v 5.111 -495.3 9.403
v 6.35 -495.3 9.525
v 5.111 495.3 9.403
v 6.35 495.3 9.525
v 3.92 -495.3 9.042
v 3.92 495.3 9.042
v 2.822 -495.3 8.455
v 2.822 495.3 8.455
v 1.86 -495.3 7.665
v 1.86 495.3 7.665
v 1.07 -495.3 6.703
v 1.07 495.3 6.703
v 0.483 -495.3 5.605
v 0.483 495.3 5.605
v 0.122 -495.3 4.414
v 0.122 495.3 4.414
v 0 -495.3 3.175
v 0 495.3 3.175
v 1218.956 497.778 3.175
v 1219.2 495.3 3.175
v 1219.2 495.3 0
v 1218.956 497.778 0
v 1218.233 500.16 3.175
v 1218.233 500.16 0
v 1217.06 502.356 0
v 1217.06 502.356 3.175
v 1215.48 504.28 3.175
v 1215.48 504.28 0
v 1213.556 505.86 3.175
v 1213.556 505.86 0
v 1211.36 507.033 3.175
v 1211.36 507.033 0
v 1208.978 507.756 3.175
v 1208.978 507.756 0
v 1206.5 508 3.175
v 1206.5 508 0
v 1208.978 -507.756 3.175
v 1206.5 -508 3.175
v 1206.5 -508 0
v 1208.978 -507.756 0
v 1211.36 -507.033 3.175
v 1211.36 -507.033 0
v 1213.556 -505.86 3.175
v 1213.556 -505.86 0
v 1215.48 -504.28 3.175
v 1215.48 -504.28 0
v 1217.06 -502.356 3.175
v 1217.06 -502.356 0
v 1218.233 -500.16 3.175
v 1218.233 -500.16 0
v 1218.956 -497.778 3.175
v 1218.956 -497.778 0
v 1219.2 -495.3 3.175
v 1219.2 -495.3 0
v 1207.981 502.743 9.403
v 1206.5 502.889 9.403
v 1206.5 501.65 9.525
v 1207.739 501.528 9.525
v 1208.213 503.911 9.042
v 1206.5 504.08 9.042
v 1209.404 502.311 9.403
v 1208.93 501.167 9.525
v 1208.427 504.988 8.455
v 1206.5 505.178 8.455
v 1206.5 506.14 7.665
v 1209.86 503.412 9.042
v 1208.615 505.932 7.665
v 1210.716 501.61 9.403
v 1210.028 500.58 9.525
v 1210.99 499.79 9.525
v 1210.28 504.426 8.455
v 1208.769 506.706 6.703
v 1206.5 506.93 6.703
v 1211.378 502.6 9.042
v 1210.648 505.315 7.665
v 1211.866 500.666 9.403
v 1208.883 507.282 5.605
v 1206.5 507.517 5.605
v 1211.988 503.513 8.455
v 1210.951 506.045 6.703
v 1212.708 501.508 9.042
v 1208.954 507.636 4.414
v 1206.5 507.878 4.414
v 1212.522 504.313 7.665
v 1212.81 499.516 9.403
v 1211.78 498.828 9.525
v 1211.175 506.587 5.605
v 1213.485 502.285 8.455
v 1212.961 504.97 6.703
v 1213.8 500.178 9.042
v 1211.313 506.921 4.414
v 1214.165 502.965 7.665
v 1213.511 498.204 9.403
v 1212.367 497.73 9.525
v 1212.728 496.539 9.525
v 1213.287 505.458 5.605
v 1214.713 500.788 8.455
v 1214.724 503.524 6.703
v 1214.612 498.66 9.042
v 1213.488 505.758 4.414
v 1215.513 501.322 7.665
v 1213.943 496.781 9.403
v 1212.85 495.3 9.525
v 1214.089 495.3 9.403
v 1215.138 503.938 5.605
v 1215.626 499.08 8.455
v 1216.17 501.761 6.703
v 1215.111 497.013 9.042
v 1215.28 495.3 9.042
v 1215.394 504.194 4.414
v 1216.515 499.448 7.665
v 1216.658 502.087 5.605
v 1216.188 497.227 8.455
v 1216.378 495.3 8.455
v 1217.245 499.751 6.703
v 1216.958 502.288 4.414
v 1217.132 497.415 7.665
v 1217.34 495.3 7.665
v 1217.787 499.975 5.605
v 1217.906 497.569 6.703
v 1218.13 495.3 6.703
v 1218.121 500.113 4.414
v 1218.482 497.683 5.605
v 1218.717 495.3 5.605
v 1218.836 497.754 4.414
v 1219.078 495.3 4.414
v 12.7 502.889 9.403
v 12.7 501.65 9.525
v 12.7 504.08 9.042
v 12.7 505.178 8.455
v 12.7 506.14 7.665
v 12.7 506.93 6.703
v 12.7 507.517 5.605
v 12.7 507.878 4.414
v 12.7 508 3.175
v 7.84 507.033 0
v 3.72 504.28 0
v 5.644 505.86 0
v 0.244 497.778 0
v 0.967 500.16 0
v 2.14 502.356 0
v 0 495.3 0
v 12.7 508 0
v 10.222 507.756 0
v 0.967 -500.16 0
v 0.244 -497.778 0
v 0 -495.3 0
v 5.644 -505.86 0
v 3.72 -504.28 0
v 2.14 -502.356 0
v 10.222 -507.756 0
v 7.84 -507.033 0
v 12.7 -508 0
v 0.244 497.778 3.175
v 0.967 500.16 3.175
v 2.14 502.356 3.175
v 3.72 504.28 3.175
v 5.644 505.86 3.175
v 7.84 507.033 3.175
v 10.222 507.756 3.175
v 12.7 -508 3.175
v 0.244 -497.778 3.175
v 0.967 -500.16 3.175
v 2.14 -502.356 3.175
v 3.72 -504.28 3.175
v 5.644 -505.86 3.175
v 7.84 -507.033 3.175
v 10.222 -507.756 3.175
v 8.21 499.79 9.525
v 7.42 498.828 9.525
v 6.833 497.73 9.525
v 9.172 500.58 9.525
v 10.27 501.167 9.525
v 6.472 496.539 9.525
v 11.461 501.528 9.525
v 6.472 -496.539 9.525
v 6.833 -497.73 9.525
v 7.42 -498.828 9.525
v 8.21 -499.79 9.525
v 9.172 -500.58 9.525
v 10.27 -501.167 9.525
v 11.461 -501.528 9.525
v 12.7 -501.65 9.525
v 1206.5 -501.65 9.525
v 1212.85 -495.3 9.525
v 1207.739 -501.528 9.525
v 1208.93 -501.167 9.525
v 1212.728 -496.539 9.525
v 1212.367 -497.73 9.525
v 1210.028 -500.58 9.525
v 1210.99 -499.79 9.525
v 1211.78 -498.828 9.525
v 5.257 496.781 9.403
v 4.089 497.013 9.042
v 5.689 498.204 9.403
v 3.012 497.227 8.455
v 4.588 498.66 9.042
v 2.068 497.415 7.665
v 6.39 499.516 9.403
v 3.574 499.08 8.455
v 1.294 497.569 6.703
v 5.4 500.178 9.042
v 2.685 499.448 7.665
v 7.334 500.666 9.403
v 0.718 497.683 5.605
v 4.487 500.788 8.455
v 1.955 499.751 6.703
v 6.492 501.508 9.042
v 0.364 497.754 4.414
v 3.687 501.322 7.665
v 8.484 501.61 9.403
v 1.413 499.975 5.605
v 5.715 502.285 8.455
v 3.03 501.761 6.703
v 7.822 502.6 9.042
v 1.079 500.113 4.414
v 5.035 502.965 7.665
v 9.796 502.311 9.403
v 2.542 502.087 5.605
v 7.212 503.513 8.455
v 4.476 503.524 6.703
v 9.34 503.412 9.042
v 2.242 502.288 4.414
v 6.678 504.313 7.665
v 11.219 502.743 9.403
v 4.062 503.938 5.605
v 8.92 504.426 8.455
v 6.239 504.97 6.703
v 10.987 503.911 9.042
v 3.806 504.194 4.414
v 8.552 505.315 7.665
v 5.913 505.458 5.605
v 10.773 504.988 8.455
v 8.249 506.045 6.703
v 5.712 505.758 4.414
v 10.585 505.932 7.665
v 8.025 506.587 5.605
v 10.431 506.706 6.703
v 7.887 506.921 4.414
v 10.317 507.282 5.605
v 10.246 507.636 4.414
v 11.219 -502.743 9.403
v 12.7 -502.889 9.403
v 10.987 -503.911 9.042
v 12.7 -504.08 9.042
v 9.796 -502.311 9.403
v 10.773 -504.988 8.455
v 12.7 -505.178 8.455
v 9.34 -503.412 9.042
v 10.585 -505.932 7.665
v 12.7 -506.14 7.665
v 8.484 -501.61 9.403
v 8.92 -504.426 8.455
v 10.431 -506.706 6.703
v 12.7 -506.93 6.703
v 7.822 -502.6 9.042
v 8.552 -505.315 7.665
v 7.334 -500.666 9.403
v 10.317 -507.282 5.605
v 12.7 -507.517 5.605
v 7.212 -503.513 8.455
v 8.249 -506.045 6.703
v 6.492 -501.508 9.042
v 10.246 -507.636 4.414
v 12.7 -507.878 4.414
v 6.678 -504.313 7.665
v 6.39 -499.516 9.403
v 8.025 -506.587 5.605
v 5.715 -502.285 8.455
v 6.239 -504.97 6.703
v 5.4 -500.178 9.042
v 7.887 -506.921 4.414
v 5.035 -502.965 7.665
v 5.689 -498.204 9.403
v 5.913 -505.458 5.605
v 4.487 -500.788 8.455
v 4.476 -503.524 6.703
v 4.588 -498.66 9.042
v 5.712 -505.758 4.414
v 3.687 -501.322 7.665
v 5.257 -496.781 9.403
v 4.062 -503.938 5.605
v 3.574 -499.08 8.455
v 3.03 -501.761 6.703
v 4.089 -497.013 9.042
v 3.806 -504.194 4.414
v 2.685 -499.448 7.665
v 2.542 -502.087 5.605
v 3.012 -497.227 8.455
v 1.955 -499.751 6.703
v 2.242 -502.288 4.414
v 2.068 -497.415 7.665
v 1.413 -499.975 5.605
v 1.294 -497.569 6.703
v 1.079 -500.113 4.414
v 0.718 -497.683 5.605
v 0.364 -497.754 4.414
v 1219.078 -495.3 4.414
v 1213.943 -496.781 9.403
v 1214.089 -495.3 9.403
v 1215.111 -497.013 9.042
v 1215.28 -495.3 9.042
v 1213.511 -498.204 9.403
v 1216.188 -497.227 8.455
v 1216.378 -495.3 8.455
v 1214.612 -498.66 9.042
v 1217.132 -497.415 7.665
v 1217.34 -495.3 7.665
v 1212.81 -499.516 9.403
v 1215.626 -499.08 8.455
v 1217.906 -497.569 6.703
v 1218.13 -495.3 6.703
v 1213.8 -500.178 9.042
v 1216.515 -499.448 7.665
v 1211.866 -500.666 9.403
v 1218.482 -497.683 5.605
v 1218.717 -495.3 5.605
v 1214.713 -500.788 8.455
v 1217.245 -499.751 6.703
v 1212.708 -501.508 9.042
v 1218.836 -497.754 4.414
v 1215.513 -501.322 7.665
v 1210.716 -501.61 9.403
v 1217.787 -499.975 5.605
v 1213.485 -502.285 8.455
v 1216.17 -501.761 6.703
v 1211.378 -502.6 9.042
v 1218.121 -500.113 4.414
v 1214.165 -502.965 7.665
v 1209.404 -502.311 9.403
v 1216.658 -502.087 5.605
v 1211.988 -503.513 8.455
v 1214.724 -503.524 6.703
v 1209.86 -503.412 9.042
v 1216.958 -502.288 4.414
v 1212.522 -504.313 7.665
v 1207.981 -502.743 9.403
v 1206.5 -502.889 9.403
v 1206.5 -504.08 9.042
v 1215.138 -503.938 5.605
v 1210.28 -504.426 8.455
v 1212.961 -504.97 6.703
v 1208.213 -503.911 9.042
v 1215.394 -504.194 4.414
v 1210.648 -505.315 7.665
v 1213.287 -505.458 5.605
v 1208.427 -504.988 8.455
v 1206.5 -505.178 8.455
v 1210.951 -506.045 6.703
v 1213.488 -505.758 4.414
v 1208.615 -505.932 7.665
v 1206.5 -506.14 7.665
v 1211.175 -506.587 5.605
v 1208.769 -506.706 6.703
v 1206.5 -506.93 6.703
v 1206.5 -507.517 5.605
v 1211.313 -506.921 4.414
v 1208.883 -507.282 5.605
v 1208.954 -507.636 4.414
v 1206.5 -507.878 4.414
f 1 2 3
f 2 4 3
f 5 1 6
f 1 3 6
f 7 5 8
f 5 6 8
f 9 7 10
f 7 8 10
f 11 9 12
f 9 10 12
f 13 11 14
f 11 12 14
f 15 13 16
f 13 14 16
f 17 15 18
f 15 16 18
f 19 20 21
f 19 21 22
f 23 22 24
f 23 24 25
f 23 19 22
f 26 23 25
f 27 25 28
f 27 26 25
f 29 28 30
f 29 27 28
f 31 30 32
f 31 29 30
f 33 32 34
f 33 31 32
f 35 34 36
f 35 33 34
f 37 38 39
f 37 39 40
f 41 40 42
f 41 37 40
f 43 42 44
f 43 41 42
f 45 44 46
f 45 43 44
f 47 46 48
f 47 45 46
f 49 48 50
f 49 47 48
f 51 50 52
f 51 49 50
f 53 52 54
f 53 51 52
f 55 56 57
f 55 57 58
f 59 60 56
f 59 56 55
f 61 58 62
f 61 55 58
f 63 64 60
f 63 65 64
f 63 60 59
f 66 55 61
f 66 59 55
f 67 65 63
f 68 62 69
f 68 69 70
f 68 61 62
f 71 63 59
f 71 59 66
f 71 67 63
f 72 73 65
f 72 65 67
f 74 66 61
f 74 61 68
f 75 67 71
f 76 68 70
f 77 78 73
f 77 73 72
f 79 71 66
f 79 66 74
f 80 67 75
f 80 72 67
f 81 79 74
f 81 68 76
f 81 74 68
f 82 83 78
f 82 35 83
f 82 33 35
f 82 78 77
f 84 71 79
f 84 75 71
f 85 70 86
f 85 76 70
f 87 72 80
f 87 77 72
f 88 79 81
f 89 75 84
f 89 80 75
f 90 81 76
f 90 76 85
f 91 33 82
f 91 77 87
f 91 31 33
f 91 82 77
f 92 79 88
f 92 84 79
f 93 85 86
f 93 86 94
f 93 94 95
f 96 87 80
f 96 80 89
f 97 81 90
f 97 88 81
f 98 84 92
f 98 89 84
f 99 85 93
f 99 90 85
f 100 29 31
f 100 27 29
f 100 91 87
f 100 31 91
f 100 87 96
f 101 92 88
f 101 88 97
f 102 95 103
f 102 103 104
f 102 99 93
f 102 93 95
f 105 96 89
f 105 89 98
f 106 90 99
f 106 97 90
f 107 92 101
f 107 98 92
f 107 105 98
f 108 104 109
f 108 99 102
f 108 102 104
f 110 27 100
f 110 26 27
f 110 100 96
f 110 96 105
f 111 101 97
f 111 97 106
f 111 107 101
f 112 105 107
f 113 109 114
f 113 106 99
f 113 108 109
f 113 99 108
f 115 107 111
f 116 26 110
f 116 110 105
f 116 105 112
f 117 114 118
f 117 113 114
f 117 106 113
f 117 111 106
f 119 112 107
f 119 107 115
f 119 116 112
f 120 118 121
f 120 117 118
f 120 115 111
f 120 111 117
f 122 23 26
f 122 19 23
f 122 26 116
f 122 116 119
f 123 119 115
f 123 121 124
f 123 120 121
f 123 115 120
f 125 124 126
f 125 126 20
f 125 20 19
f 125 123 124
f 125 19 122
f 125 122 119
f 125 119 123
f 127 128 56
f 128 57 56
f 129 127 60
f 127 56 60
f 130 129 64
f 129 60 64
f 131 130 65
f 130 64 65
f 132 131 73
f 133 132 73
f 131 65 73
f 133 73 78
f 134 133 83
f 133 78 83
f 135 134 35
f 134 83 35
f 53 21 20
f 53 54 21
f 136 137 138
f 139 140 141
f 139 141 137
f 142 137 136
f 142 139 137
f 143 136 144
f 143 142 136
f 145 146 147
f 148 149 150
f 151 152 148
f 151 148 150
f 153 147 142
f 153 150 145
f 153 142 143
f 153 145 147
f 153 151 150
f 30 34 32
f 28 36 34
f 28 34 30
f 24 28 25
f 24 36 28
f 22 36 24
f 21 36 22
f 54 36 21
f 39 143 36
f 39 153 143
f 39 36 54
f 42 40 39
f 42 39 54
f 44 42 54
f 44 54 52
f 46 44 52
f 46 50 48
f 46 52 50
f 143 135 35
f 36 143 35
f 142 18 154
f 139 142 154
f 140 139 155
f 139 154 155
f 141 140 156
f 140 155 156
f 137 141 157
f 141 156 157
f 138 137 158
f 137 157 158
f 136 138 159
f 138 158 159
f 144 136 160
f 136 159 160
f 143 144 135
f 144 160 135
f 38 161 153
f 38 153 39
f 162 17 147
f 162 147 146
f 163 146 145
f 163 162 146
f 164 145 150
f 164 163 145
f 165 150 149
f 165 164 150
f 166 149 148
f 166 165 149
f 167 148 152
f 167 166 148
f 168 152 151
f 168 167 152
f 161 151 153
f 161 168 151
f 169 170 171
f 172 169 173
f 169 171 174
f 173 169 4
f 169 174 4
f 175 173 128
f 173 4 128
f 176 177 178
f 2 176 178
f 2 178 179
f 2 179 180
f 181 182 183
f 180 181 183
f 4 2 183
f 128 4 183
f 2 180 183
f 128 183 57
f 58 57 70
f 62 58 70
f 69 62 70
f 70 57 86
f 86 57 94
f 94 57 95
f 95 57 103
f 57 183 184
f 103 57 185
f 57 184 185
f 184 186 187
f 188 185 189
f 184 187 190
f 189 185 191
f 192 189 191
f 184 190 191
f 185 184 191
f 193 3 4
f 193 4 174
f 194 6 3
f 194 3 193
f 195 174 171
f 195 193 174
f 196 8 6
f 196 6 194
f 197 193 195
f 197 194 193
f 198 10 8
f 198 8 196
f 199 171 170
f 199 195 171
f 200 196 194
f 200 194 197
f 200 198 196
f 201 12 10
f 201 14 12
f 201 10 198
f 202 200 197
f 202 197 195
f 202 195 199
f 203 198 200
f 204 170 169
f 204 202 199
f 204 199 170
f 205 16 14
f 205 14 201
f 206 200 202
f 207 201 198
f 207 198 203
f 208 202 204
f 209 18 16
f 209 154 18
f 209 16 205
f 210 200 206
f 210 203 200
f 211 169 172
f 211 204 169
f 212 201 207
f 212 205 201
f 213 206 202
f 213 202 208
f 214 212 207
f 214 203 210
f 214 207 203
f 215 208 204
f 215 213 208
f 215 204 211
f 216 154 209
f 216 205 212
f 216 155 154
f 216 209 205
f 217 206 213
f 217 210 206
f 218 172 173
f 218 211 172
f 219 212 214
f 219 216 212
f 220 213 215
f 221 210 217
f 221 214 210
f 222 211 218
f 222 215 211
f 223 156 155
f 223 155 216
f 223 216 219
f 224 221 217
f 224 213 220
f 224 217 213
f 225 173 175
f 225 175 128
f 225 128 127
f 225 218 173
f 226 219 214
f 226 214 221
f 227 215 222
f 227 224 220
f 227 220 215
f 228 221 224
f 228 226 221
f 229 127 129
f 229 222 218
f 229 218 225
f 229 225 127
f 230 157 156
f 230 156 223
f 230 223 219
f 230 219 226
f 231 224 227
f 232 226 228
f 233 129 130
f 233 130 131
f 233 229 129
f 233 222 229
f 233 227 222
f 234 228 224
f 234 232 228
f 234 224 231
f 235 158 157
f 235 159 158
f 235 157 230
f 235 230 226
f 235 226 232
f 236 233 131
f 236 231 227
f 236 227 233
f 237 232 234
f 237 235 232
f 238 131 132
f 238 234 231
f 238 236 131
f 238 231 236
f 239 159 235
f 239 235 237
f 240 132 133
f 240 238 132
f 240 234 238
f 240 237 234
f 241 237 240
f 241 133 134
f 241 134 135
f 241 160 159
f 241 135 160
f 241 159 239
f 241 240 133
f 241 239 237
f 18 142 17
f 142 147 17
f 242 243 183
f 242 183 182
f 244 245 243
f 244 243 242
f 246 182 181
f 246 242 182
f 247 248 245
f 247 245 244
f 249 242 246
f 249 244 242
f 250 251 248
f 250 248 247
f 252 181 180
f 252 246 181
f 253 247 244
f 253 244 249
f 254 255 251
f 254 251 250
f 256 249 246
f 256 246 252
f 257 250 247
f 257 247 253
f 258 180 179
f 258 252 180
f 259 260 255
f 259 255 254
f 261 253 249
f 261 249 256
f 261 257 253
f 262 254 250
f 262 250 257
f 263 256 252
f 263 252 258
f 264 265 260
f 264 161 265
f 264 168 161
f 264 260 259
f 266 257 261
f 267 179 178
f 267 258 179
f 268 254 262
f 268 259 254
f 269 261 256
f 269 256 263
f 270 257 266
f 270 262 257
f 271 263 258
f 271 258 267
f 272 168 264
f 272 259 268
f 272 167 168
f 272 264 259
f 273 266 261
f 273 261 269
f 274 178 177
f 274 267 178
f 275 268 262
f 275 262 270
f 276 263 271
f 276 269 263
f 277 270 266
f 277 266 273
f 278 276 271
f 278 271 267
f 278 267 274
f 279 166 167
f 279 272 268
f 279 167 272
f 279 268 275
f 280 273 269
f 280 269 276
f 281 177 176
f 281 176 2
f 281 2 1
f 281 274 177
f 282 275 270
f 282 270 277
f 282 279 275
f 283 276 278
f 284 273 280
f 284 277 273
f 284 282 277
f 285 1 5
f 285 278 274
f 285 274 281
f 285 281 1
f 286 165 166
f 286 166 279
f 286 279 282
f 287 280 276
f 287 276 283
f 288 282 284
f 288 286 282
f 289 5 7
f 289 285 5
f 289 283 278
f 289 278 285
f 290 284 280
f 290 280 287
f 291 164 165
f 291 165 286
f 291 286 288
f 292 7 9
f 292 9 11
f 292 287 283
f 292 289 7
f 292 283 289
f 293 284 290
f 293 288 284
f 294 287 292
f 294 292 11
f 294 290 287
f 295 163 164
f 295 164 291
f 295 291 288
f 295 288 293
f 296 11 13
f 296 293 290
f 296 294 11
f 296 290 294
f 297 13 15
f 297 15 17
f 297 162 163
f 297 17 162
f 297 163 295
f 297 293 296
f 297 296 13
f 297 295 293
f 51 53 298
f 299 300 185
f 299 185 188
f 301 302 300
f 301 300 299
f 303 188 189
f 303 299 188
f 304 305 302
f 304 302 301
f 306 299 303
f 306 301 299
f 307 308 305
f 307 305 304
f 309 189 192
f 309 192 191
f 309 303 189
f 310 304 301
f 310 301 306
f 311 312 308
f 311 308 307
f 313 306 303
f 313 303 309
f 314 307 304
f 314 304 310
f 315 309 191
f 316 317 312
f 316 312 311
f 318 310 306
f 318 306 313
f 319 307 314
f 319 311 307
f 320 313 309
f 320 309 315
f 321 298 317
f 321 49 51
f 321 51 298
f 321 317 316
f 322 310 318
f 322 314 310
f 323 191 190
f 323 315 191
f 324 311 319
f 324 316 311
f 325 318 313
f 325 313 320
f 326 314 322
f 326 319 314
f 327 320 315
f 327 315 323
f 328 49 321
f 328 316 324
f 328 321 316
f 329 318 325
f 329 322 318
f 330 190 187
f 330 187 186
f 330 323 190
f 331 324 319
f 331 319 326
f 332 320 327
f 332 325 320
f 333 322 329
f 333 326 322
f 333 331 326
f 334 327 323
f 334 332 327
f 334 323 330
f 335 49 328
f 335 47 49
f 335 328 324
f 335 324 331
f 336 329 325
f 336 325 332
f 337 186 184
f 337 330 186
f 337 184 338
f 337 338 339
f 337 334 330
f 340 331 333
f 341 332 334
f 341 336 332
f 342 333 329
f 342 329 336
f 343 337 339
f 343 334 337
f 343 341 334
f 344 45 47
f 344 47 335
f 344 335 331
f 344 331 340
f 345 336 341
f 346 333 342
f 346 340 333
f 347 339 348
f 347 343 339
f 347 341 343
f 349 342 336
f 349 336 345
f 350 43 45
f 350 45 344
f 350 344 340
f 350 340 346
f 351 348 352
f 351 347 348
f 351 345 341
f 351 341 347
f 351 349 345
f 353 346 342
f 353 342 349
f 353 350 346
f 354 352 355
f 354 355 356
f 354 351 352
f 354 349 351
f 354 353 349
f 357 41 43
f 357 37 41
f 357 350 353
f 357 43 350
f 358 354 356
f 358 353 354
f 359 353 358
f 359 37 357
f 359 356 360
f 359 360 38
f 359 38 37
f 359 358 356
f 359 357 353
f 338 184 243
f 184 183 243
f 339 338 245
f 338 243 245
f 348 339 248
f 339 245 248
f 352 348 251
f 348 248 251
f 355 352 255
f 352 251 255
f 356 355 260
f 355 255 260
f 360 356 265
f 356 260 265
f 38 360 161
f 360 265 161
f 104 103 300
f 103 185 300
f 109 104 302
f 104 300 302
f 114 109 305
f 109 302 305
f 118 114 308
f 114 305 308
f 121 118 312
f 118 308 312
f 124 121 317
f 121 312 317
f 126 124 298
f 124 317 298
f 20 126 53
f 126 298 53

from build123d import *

# Parameters (mm, degrees)
F0_W     = 1219.2
F0_H     = 9.525
F1_DEPTH = 508
F2_R     = 12.7
F3_R     = 6.35


with BuildPart() as f1:
    # F0 (on Front) → F1 (new body, symmetric)
    with BuildSketch(Plane.XZ):
        with Locations((609.6, 4.7625)):
            Rectangle(F0_W, F0_H)
    extrude(amount=F1_DEPTH, both=True)

    # F2
    f2_edges = [f1.edges().sort_by_distance(p)[0] for p in [
        (1219.2, -508, 4.7625),
        (1219.2, 508, 4.7625),
        (0, 508, 4.7625),
        (0, -508, 4.7625),
    ]]
    fillet(f2_edges, radius=F2_R)

    # F3
    f3_edges = [f1.edges().sort_by_distance(p)[0] for p in [
        (609.6, 508, 9.525),
        (1215.480256, 504.280256, 9.525),
        (3.719744, 504.280256, 9.525),
        (1219.2, 0, 9.525),
        (0, 0, 9.525),
        (1215.480256, -504.280256, 9.525),
        (3.719744, -504.280256, 9.525),
        (609.6, -508, 9.525),
    ]]
    fillet(f3_edges, radius=F3_R)


solid = f1.part
